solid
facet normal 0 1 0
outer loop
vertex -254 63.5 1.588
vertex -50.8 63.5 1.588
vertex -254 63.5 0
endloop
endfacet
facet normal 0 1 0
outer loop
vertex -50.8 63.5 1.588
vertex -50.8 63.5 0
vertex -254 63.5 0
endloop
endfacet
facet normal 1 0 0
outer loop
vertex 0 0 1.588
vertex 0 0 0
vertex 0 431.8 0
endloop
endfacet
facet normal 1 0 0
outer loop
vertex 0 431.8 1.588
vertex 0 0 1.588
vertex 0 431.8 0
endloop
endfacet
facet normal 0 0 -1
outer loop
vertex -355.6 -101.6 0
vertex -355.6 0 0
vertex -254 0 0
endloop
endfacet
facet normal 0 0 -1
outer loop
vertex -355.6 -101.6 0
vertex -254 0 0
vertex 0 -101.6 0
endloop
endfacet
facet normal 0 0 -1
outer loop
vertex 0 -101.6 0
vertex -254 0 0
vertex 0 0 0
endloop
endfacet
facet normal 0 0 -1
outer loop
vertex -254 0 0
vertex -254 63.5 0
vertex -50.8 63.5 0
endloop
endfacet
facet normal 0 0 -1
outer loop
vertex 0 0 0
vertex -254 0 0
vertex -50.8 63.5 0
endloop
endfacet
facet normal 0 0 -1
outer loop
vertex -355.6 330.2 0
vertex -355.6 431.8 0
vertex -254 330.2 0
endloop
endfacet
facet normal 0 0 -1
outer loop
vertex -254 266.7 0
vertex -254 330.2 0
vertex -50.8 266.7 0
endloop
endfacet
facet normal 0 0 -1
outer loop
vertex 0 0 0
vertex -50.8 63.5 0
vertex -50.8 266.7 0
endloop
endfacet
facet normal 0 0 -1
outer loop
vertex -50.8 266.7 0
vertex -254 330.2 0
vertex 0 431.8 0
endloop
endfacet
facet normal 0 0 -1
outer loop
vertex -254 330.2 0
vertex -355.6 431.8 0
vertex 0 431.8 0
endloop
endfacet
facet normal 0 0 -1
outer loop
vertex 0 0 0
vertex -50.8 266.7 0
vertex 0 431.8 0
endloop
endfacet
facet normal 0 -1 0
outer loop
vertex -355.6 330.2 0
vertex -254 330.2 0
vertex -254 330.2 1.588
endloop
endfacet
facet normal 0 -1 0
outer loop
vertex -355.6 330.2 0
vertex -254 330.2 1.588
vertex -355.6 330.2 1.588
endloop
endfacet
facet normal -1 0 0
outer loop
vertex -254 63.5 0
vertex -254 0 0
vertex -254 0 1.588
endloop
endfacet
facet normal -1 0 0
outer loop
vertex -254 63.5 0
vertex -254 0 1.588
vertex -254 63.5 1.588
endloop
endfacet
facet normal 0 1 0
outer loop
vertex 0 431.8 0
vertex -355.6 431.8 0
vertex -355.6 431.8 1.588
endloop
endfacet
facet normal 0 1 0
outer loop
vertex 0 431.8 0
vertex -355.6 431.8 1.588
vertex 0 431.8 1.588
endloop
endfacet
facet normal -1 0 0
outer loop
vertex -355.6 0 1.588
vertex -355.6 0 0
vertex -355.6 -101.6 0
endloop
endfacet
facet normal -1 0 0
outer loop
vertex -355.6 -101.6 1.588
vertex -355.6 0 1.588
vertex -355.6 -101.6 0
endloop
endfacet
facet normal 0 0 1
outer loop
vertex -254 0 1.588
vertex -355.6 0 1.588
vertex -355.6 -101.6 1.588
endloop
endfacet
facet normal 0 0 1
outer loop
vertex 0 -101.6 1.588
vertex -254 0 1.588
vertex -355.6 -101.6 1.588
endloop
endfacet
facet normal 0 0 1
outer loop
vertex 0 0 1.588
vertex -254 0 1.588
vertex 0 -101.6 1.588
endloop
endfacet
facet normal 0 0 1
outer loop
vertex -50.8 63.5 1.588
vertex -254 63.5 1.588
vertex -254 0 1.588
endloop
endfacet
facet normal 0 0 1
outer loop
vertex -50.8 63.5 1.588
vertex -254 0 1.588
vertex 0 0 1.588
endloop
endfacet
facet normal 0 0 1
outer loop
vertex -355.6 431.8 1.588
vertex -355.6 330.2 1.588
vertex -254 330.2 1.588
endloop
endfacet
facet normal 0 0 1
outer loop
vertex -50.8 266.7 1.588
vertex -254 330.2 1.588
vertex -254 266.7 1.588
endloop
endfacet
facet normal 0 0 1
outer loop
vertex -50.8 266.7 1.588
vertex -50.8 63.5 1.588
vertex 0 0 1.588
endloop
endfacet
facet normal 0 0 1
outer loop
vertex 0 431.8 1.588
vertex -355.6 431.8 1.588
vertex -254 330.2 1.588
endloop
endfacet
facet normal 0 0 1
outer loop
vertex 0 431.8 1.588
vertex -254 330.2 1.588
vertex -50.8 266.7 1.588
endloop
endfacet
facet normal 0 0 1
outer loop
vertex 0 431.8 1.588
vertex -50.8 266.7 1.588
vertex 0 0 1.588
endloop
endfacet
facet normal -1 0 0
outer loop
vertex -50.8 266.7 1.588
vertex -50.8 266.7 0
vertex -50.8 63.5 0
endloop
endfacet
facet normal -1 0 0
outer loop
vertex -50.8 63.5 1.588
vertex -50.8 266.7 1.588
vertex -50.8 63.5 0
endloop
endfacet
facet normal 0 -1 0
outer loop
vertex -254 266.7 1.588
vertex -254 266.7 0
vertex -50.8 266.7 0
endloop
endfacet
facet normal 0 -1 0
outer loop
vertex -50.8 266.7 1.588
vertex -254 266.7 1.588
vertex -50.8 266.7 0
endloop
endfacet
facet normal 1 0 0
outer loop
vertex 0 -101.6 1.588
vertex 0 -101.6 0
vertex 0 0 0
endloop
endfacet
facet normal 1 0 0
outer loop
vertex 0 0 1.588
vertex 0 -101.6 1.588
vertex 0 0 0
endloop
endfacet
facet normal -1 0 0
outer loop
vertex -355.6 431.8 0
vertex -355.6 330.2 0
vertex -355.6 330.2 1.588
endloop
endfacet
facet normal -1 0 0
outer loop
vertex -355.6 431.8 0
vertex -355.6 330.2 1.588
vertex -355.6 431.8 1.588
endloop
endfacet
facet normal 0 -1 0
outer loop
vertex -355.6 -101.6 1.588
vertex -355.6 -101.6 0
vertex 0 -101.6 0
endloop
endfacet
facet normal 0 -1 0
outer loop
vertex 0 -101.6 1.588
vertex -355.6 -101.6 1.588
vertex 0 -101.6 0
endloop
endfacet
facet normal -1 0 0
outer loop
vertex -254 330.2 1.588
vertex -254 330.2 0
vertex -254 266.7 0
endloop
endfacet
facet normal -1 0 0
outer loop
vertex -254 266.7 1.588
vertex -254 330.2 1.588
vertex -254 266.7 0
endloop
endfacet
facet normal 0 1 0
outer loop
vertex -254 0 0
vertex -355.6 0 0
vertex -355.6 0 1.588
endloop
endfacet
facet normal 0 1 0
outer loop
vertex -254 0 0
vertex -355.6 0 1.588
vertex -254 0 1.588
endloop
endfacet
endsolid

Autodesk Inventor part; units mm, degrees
ref_plane "YZ Plane" through (0, 0, 0) normal (1, 0, 0) x (0, 1, 0)
ref_plane "XZ Plane" through (0, 0, 0) normal (0, 1, 0) x (-1, 0, 0)
ref_plane "XY Plane" through (0, 0, 0) normal (0, 0, 1) x (1, 0, 0)
sketch "Sketch1" plane through (0, 0, 0) normal (0, 0, 1) x (1, 0, 0)
  line L0 (-355.6, 0) -> (-355.6, -101.6)
  line L1 (-355.6, -101.6) -> (0, -101.6)
  line L2 (0, -101.6) -> (0, 0)
  line L3 (-254, 330.2) -> (-355.6, 330.2)
  line L4 (-355.6, 330.2) -> (-355.6, 431.8)
  line L5 (-355.6, 431.8) -> (0, 431.8)
  line L6 (0, 0) -> (0, 431.8)
  line L7 (-355.6, 0) -> (-254, 0)
  line L8 (-254, 330.2) -> (-254, 266.7)
  line L9 (-254, 0) -> (-254, 63.5)
  line L10 (-254, 266.7) -> (-50.8, 266.7)
  line L11 (-50.8, 266.7) -> (-50.8, 63.5)
  line L12 (-50.8, 63.5) -> (-254, 63.5)
  dimension "d4" = 355.6
  dimension "d5" = 101.6
  dimension "d6" = 101.6
  dimension "d7" = 431.8
  dimension "d9" = 63.5
  dimension "d10" = 63.5
  dimension "d11" = 50.8
  dimension "d12" = 101.6
extrude "Extrusion1" add sketch "Sketch1" along normal blind 1.5875
properties part number "skid plate" material "Aluminum 6061"
